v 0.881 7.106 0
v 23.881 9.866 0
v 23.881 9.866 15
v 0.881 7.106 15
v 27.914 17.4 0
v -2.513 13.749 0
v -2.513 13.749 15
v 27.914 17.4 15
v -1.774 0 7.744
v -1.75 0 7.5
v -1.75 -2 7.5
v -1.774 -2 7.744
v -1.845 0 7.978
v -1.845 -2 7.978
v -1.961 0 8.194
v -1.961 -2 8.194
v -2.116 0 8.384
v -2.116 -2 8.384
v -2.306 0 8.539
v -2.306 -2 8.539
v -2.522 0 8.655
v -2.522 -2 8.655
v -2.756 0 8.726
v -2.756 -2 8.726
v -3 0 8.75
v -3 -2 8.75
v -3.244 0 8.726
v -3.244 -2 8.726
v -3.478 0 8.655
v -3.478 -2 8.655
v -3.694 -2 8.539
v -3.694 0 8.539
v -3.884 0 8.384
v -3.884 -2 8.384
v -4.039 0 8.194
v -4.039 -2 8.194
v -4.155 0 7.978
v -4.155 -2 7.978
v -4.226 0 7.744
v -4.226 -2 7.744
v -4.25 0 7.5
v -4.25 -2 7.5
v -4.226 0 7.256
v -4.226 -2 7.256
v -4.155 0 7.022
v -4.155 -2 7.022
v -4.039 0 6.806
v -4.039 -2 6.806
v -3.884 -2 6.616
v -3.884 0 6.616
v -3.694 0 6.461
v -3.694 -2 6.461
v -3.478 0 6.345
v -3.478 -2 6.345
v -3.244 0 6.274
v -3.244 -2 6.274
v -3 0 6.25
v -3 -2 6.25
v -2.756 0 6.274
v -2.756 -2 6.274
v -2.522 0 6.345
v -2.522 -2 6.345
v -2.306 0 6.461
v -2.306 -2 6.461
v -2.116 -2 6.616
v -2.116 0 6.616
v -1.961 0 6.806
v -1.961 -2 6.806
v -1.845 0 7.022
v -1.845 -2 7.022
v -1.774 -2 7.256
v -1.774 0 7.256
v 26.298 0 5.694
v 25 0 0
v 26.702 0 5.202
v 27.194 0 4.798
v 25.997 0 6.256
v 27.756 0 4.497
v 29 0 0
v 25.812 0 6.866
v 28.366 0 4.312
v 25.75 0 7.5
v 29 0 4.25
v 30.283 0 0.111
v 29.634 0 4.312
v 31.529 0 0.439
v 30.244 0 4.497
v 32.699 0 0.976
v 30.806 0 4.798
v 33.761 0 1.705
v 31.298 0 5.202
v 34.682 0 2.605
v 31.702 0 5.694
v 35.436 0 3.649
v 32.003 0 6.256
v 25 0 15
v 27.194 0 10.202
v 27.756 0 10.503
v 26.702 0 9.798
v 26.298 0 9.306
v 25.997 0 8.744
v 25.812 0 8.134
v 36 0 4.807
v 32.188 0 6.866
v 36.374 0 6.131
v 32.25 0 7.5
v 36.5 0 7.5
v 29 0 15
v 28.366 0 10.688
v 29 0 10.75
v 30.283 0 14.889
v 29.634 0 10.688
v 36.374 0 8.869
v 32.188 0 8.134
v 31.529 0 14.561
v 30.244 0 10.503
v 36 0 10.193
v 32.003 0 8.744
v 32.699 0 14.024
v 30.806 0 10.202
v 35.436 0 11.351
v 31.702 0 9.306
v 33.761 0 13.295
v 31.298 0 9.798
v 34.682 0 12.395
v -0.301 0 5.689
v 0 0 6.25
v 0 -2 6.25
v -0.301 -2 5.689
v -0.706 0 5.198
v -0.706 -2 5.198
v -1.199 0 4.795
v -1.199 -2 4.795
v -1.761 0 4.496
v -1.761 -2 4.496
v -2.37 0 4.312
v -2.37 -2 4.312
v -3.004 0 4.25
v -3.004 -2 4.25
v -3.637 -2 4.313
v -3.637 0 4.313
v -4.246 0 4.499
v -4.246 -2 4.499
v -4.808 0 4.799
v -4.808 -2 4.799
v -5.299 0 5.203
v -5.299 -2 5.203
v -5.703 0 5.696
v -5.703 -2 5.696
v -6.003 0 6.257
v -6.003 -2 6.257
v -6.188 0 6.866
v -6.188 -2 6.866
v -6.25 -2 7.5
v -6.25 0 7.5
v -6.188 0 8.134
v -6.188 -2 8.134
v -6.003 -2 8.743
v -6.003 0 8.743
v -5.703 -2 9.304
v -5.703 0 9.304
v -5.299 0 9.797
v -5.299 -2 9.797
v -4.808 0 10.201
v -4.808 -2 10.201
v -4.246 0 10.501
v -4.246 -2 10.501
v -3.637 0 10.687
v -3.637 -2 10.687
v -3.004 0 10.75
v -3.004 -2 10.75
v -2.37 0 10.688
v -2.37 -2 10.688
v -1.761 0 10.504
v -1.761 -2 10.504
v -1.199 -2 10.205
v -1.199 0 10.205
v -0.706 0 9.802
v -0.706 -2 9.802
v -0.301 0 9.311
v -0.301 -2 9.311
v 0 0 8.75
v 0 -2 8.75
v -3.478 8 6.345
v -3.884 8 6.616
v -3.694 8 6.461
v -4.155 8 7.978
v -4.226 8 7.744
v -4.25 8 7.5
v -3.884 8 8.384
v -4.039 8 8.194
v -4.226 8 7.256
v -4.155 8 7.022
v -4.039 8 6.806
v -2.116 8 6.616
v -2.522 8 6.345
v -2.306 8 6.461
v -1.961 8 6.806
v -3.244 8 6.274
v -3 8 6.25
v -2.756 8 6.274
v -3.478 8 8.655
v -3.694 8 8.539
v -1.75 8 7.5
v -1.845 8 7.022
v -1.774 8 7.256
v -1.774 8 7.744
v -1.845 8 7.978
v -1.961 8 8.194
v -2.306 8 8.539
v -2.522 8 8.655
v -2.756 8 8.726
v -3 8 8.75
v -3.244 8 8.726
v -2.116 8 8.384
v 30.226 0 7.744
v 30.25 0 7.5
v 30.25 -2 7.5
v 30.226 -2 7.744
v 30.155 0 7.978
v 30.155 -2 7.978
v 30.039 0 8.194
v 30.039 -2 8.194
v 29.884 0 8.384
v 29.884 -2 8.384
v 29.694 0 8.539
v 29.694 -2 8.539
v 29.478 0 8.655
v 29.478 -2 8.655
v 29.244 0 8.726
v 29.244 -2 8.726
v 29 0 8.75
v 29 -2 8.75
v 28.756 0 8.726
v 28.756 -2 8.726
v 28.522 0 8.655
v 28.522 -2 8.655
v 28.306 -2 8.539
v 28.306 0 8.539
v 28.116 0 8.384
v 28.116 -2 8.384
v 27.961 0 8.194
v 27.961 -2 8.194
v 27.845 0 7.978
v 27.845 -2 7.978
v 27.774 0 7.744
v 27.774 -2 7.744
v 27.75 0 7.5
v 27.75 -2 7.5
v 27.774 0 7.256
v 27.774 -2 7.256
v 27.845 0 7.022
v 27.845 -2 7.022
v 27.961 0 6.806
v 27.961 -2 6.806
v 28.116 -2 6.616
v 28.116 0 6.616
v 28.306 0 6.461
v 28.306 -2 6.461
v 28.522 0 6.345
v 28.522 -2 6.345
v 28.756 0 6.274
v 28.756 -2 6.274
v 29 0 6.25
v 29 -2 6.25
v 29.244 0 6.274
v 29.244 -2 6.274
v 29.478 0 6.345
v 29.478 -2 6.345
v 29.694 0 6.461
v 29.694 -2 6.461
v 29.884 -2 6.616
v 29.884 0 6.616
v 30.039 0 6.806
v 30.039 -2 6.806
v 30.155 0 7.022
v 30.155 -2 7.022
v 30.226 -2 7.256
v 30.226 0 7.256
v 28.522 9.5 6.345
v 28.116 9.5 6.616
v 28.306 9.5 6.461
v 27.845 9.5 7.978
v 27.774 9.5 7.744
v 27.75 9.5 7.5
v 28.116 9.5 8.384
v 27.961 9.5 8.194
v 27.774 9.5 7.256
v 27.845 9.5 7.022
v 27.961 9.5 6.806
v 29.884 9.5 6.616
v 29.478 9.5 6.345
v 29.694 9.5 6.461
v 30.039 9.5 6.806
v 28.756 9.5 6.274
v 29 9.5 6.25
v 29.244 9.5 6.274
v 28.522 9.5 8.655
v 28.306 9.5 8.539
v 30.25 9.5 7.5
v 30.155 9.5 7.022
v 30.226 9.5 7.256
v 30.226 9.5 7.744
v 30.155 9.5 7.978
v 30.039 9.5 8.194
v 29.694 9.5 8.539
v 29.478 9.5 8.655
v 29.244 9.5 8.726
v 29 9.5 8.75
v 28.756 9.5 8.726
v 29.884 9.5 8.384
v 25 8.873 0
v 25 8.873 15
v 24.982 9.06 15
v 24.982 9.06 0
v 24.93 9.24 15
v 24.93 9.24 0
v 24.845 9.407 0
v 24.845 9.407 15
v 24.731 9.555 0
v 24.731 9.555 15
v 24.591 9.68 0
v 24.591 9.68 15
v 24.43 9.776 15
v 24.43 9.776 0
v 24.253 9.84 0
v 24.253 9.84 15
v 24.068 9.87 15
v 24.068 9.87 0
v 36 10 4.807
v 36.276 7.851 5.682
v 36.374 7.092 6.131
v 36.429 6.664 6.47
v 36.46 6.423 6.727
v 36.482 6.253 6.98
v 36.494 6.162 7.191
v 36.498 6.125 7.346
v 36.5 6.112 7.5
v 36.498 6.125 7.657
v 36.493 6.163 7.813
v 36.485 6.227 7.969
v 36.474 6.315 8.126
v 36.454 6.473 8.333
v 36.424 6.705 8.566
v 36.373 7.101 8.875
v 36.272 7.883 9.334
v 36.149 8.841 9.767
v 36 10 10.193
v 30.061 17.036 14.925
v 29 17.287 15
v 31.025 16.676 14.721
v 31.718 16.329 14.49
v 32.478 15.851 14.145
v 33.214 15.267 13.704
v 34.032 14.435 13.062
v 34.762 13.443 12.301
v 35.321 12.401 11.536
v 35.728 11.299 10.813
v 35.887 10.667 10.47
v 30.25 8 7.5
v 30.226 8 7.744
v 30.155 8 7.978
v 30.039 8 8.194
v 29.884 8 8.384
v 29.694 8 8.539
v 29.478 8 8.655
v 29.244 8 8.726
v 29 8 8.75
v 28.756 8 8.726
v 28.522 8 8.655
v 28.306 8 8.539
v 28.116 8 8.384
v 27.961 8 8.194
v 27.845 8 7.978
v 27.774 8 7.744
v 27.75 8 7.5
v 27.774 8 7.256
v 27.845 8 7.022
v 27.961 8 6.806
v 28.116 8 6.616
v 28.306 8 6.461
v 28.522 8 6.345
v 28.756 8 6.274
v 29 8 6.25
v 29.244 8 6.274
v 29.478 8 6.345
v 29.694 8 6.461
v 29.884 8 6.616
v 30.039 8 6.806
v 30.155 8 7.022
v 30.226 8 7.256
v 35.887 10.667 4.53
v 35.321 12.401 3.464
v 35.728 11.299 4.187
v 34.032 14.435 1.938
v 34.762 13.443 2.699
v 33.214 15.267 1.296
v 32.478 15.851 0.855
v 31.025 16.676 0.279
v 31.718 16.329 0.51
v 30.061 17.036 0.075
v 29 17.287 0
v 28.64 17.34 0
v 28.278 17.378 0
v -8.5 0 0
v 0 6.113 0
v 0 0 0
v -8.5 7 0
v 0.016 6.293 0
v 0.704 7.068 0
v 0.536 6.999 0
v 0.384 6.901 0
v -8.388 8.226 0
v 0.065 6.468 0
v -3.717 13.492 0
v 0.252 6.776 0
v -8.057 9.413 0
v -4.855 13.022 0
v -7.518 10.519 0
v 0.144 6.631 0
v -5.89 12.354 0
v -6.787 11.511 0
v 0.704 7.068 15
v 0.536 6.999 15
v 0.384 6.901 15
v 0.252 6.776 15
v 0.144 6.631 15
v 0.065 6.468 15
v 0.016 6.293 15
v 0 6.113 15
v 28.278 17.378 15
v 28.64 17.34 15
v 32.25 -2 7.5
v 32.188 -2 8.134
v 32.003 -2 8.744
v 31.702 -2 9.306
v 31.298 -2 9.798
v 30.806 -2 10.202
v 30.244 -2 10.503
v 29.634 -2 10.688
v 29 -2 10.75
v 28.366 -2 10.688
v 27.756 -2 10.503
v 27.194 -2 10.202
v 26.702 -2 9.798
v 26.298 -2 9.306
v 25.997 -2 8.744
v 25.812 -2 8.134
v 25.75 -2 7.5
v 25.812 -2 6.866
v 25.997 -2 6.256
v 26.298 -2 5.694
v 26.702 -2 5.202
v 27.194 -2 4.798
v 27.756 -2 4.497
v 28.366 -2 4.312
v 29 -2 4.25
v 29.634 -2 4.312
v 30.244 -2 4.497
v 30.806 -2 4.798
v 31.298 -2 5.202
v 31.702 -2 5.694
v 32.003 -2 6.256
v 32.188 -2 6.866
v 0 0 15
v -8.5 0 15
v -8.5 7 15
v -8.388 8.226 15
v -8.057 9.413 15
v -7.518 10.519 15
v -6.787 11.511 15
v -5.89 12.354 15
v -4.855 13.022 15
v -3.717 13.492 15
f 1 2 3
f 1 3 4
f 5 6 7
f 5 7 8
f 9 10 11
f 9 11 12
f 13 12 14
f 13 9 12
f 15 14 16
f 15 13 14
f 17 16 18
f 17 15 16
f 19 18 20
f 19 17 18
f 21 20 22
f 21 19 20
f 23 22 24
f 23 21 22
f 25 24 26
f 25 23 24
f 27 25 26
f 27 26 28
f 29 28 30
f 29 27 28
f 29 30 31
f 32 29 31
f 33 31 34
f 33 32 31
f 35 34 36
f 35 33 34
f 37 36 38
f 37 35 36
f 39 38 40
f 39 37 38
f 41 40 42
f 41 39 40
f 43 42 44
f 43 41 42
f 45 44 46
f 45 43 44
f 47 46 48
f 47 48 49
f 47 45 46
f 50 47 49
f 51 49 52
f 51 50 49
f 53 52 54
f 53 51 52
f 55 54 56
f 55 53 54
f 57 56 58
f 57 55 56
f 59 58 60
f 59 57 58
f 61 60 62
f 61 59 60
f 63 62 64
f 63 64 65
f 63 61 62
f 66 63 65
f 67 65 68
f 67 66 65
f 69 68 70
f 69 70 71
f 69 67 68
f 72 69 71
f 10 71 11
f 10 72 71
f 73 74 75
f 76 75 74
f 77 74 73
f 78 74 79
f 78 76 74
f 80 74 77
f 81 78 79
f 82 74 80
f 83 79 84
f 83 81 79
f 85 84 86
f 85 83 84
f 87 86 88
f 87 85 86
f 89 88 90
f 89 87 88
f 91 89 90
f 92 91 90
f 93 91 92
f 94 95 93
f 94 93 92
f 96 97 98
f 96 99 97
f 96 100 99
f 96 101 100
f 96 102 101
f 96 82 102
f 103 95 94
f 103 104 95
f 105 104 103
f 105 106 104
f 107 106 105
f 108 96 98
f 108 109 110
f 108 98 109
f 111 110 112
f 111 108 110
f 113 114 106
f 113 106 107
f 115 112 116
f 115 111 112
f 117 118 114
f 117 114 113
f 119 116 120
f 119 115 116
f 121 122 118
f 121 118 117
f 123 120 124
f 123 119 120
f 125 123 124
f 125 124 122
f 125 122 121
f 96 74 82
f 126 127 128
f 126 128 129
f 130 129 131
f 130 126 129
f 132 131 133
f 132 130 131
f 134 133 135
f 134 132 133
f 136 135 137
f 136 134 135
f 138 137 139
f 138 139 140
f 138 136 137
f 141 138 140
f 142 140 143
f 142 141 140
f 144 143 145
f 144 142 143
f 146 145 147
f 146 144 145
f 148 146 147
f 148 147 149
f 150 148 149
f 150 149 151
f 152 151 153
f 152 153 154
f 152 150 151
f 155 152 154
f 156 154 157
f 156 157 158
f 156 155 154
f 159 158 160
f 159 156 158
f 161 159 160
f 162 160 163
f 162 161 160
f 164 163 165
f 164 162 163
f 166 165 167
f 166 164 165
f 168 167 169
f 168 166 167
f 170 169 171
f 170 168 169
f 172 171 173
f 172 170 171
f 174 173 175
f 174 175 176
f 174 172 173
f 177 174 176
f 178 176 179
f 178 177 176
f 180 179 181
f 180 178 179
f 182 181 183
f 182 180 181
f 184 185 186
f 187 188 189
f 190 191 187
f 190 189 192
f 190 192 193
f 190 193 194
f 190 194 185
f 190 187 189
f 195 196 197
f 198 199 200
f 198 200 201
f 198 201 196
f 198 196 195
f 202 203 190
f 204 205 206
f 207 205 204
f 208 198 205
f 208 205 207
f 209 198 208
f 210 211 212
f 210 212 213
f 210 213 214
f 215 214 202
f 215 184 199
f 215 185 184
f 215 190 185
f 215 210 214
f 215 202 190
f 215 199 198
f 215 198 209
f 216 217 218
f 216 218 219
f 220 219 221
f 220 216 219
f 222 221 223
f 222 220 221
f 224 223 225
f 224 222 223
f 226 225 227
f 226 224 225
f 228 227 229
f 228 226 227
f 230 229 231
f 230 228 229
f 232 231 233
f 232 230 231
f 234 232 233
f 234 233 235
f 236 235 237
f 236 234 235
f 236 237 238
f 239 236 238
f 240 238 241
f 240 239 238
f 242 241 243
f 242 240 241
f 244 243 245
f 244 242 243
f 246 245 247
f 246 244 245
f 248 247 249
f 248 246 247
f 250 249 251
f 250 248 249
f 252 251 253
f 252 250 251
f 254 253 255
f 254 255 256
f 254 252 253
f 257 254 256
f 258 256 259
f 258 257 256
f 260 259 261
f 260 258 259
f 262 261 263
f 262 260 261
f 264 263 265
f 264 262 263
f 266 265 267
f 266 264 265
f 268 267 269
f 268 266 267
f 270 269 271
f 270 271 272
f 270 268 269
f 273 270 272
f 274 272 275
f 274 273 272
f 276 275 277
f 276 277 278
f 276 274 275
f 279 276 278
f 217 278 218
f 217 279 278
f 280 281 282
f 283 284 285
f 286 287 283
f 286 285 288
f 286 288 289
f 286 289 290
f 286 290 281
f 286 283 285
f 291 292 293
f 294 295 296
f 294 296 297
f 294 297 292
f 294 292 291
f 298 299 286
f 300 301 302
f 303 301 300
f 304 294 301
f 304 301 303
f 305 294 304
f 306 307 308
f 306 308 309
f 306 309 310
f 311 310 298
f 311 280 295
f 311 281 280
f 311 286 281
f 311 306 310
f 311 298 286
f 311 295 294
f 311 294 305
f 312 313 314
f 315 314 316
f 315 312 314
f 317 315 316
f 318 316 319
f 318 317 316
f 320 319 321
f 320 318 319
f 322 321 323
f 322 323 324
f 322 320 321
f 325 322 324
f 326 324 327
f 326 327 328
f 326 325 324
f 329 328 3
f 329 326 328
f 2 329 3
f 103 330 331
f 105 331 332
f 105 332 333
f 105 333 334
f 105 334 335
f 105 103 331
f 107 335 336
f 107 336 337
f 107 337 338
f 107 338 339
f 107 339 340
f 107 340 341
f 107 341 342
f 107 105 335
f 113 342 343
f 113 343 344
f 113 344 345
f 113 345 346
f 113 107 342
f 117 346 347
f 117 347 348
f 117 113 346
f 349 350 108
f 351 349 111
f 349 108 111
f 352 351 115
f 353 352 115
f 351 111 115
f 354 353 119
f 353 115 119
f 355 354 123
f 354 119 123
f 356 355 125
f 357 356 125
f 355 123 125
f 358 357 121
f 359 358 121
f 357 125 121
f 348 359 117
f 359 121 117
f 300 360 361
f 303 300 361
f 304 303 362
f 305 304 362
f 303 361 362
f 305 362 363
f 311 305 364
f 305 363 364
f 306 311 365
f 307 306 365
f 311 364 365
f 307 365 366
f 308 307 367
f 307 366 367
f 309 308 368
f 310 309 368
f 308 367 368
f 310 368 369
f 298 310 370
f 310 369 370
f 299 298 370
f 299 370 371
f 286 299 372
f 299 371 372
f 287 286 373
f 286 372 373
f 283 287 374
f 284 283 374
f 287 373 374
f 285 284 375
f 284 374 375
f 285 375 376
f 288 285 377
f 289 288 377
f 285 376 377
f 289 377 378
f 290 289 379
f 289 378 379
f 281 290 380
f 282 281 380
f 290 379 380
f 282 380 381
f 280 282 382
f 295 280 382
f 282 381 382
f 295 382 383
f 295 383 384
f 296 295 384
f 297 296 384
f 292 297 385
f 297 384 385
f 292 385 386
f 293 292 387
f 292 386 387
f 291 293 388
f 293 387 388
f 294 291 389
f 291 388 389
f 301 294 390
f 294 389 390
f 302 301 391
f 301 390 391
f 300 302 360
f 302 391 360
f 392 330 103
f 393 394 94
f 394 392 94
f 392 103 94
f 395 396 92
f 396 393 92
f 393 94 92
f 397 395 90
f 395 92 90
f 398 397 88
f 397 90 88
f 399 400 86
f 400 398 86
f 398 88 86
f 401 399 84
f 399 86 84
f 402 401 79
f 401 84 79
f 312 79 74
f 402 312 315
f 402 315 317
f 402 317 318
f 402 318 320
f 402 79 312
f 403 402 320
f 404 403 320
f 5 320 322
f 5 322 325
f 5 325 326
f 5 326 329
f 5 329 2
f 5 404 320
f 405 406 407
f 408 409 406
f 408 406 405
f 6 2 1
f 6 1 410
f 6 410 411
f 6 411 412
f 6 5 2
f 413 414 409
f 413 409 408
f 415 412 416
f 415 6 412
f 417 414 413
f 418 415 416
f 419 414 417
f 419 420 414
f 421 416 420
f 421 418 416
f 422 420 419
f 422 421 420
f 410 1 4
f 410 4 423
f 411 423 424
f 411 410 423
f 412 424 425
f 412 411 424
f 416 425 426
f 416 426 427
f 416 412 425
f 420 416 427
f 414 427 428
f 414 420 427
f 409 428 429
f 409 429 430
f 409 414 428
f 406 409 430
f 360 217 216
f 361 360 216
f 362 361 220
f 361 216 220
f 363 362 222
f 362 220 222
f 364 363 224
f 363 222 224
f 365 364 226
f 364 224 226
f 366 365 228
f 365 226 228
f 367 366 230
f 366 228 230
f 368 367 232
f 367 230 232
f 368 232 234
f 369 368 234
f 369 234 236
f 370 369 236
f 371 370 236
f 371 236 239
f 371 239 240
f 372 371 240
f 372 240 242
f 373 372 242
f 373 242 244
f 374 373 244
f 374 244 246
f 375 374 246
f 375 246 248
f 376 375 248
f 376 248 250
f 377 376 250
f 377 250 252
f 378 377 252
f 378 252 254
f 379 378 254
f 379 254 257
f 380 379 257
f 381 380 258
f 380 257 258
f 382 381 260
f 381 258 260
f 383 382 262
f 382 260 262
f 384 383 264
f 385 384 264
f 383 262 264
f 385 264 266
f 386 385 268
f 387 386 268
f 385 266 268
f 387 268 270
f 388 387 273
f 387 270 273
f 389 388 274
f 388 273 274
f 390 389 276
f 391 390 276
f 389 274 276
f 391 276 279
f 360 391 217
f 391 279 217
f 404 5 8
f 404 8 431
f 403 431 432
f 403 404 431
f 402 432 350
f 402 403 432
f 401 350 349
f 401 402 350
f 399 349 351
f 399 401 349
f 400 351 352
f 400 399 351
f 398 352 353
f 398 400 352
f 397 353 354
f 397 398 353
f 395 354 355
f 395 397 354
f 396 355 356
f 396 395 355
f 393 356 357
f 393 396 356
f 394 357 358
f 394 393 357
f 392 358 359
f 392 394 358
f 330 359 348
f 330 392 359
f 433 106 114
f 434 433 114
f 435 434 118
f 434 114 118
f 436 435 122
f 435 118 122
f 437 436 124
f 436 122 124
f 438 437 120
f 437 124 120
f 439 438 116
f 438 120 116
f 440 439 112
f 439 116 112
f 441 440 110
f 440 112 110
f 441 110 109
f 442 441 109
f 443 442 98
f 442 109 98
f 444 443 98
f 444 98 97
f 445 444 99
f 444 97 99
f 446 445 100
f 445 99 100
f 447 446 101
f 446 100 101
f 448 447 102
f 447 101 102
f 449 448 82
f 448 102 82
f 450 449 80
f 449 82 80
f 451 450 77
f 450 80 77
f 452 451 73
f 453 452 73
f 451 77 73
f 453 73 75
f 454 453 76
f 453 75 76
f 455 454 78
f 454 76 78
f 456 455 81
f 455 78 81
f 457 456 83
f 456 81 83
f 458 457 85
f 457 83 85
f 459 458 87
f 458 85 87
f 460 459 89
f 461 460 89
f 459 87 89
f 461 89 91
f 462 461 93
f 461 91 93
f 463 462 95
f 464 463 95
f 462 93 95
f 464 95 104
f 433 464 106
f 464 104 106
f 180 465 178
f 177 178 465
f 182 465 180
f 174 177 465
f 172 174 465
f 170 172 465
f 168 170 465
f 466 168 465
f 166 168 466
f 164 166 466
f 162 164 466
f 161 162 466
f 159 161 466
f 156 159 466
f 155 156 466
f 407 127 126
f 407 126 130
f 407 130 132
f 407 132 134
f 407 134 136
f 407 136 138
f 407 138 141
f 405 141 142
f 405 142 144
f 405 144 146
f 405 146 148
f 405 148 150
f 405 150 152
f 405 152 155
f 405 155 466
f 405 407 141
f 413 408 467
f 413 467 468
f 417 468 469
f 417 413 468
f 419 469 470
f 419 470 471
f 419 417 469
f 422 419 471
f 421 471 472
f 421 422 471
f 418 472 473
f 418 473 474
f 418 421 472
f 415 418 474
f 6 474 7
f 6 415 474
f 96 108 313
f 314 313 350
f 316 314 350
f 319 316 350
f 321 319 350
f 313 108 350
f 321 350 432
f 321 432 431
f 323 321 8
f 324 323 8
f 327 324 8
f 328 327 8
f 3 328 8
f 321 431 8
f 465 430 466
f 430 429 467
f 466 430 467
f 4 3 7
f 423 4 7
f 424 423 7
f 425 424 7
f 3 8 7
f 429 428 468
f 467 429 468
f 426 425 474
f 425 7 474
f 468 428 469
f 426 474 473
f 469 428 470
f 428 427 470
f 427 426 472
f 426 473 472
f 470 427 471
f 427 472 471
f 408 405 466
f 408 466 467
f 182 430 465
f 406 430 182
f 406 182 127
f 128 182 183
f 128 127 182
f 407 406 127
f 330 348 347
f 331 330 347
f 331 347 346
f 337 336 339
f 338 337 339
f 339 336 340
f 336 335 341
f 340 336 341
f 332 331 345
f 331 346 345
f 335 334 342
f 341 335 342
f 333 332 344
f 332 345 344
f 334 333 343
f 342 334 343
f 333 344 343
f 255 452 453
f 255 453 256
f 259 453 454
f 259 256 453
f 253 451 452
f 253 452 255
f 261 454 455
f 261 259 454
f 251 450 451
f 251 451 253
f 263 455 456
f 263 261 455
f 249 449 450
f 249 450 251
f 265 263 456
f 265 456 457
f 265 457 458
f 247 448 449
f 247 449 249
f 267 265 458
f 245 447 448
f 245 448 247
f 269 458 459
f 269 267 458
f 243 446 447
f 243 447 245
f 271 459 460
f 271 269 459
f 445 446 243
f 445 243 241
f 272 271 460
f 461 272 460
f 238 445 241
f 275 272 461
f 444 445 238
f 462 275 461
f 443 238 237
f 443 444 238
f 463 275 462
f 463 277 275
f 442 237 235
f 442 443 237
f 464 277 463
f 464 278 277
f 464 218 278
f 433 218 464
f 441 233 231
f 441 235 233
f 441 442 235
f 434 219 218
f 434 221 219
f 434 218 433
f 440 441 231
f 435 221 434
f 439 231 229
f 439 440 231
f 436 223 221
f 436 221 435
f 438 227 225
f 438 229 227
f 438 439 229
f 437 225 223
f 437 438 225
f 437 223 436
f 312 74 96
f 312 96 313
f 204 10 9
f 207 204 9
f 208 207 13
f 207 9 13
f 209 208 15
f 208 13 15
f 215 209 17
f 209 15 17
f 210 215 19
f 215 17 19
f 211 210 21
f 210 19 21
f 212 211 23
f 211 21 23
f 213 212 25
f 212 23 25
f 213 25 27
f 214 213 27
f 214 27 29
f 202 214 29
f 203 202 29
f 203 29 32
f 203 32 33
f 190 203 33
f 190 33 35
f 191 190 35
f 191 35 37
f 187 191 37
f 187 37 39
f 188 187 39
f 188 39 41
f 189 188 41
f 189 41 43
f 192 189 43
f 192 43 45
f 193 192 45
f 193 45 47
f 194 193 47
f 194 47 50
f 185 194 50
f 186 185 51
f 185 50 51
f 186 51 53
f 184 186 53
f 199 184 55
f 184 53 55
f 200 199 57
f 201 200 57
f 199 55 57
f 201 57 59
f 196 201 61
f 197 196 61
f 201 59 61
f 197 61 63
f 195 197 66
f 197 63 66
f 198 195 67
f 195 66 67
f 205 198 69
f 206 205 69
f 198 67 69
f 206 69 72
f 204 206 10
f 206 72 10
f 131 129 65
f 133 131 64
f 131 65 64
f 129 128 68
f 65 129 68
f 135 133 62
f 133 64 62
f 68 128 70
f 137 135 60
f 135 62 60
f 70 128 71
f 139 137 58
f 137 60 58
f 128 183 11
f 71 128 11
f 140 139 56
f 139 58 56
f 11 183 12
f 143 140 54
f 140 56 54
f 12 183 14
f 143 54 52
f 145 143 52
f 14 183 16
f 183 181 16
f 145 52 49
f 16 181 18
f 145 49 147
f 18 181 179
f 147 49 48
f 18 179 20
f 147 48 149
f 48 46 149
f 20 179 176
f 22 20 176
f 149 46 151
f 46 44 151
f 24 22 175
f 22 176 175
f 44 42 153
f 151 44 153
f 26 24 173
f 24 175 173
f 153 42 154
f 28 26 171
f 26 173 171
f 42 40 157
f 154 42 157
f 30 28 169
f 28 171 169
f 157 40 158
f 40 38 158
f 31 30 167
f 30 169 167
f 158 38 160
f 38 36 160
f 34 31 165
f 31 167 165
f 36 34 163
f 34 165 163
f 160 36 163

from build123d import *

# Parameters (mm, degrees)
BOSS_EXTRUDE2_DEPTH = 15
CUT_EXTRUDE1_DEPTH  = 25
BOSS_EXTRUDE3_DEPTH = 10
CUT_EXTRUDE2_DEPTH  = 15
SKETCH7_R           = 3.25
SKETCH7_R_2         = 1.25
BOSS_EXTRUDE4_DEPTH = 2
SKETCH9_R           = 1.25
CUT_EXTRUDE3_DEPTH  = 10
SKETCH10_R          = 1.25
CUT_EXTRUDE4_DEPTH  = 1.5


with BuildPart() as part:
    # Sketch3 → Boss-Extrude2 (new body)
    with BuildSketch(Plane.XY):
        with BuildLine():
            Line((0, 0), (-8.5, 0))
            Line((-8.5, 0), (-8.5, 7))
            ThreePointArc((-8.5, 7), (-6.787440348, 11.510881004), (-2.512734375, 13.74869173))
            Line((-2.512734375, 13.74869173), (27.914319597, 17.399938206))
            ThreePointArc((27.914319597, 17.399938206), (33.311410485, 15.179716356), (36, 10))
            Line((36, 10), (36, 0))
            Line((36, 0), (25, 0))
            Line((25, 0), (25, 8.872825735))
            ThreePointArc((25, 8.872825735), (24.663647037, 9.620871596), (23.880854779, 9.865702574))
            Line((23.880854779, 9.865702574), (0.880854779, 7.105702574))
            ThreePointArc((0.880854779, 7.105702574), (0.251954139, 6.776472772), (0, 6.112825735))
            Line((0, 6.112825735), (0, 0))
        make_face()
    extrude(amount=BOSS_EXTRUDE2_DEPTH)

    # Sketch4 → Cut-Extrude1 (cut)
    with BuildSketch(Plane.XZ):
        with BuildLine():
            Line((36, 15), (29, 15))
            ThreePointArc((29, 15), (33.245917567, 13.68240924), (36, 10.192582404))
            Line((36, 10.192582404), (36, 15))
        make_face()
        with BuildLine():
            Line((36, 0), (36, 4.807417596))
            ThreePointArc((36, 4.807417596), (33.245917567, 1.31759076), (29, 0))
            Line((29, 0), (36, 0))
        make_face()
    extrude(amount=-CUT_EXTRUDE1_DEPTH, mode=Mode.SUBTRACT)

    # Sketch5 → Boss-Extrude3 (add)
    with BuildSketch(Plane.XZ):
        with BuildLine():
            ThreePointArc((36, 4.807417596), (36.5, 7.5), (36, 10.192582404))
            Line((36, 10.192582404), (36, 4.807417596))
        make_face()
    extrude(amount=-BOSS_EXTRUDE3_DEPTH)

    # Sketch6 → Cut-Extrude2 (cut)
    with BuildSketch(Plane.XY.offset(15)):
        Polygon((36.5, 10), (36, 10), (36.5, 6.112287873), align=None)
    extrude(amount=-CUT_EXTRUDE2_DEPTH, mode=Mode.SUBTRACT)

    # Sketch7 → Boss-Extrude4 (add)
    with BuildSketch(Plane.XZ):
        with Locations((29, 7.5)):
            Circle(SKETCH7_R)
        with Locations((29, 7.5)):
            Circle(SKETCH7_R_2, mode=Mode.SUBTRACT)
        with BuildLine():
            Line((0, 8.75), (0, 6.25))
            ThreePointArc((0, 6.25), (-6.25, 7.5), (0, 8.75))
        make_face()
        with Locations((-3, 7.5)):
            Circle(SKETCH7_R_2, mode=Mode.SUBTRACT)
    extrude(amount=BOSS_EXTRUDE4_DEPTH)

    # Sketch9 → Cut-Extrude3 (cut)
    with BuildSketch(Plane.XZ.offset(2)):
        with Locations((29, 7.5)):
            Circle(SKETCH9_R)
        with Locations((-3, 7.5)):
            Circle(SKETCH9_R)
    extrude(amount=-CUT_EXTRUDE3_DEPTH, mode=Mode.SUBTRACT)

    # Sketch10 → Cut-Extrude4 (cut)
    with BuildSketch(Plane.XZ.offset(-8)):
        with Locations((29, 7.5)):
            Circle(SKETCH10_R)
    extrude(amount=-CUT_EXTRUDE4_DEPTH, mode=Mode.SUBTRACT)


solid = part.part
